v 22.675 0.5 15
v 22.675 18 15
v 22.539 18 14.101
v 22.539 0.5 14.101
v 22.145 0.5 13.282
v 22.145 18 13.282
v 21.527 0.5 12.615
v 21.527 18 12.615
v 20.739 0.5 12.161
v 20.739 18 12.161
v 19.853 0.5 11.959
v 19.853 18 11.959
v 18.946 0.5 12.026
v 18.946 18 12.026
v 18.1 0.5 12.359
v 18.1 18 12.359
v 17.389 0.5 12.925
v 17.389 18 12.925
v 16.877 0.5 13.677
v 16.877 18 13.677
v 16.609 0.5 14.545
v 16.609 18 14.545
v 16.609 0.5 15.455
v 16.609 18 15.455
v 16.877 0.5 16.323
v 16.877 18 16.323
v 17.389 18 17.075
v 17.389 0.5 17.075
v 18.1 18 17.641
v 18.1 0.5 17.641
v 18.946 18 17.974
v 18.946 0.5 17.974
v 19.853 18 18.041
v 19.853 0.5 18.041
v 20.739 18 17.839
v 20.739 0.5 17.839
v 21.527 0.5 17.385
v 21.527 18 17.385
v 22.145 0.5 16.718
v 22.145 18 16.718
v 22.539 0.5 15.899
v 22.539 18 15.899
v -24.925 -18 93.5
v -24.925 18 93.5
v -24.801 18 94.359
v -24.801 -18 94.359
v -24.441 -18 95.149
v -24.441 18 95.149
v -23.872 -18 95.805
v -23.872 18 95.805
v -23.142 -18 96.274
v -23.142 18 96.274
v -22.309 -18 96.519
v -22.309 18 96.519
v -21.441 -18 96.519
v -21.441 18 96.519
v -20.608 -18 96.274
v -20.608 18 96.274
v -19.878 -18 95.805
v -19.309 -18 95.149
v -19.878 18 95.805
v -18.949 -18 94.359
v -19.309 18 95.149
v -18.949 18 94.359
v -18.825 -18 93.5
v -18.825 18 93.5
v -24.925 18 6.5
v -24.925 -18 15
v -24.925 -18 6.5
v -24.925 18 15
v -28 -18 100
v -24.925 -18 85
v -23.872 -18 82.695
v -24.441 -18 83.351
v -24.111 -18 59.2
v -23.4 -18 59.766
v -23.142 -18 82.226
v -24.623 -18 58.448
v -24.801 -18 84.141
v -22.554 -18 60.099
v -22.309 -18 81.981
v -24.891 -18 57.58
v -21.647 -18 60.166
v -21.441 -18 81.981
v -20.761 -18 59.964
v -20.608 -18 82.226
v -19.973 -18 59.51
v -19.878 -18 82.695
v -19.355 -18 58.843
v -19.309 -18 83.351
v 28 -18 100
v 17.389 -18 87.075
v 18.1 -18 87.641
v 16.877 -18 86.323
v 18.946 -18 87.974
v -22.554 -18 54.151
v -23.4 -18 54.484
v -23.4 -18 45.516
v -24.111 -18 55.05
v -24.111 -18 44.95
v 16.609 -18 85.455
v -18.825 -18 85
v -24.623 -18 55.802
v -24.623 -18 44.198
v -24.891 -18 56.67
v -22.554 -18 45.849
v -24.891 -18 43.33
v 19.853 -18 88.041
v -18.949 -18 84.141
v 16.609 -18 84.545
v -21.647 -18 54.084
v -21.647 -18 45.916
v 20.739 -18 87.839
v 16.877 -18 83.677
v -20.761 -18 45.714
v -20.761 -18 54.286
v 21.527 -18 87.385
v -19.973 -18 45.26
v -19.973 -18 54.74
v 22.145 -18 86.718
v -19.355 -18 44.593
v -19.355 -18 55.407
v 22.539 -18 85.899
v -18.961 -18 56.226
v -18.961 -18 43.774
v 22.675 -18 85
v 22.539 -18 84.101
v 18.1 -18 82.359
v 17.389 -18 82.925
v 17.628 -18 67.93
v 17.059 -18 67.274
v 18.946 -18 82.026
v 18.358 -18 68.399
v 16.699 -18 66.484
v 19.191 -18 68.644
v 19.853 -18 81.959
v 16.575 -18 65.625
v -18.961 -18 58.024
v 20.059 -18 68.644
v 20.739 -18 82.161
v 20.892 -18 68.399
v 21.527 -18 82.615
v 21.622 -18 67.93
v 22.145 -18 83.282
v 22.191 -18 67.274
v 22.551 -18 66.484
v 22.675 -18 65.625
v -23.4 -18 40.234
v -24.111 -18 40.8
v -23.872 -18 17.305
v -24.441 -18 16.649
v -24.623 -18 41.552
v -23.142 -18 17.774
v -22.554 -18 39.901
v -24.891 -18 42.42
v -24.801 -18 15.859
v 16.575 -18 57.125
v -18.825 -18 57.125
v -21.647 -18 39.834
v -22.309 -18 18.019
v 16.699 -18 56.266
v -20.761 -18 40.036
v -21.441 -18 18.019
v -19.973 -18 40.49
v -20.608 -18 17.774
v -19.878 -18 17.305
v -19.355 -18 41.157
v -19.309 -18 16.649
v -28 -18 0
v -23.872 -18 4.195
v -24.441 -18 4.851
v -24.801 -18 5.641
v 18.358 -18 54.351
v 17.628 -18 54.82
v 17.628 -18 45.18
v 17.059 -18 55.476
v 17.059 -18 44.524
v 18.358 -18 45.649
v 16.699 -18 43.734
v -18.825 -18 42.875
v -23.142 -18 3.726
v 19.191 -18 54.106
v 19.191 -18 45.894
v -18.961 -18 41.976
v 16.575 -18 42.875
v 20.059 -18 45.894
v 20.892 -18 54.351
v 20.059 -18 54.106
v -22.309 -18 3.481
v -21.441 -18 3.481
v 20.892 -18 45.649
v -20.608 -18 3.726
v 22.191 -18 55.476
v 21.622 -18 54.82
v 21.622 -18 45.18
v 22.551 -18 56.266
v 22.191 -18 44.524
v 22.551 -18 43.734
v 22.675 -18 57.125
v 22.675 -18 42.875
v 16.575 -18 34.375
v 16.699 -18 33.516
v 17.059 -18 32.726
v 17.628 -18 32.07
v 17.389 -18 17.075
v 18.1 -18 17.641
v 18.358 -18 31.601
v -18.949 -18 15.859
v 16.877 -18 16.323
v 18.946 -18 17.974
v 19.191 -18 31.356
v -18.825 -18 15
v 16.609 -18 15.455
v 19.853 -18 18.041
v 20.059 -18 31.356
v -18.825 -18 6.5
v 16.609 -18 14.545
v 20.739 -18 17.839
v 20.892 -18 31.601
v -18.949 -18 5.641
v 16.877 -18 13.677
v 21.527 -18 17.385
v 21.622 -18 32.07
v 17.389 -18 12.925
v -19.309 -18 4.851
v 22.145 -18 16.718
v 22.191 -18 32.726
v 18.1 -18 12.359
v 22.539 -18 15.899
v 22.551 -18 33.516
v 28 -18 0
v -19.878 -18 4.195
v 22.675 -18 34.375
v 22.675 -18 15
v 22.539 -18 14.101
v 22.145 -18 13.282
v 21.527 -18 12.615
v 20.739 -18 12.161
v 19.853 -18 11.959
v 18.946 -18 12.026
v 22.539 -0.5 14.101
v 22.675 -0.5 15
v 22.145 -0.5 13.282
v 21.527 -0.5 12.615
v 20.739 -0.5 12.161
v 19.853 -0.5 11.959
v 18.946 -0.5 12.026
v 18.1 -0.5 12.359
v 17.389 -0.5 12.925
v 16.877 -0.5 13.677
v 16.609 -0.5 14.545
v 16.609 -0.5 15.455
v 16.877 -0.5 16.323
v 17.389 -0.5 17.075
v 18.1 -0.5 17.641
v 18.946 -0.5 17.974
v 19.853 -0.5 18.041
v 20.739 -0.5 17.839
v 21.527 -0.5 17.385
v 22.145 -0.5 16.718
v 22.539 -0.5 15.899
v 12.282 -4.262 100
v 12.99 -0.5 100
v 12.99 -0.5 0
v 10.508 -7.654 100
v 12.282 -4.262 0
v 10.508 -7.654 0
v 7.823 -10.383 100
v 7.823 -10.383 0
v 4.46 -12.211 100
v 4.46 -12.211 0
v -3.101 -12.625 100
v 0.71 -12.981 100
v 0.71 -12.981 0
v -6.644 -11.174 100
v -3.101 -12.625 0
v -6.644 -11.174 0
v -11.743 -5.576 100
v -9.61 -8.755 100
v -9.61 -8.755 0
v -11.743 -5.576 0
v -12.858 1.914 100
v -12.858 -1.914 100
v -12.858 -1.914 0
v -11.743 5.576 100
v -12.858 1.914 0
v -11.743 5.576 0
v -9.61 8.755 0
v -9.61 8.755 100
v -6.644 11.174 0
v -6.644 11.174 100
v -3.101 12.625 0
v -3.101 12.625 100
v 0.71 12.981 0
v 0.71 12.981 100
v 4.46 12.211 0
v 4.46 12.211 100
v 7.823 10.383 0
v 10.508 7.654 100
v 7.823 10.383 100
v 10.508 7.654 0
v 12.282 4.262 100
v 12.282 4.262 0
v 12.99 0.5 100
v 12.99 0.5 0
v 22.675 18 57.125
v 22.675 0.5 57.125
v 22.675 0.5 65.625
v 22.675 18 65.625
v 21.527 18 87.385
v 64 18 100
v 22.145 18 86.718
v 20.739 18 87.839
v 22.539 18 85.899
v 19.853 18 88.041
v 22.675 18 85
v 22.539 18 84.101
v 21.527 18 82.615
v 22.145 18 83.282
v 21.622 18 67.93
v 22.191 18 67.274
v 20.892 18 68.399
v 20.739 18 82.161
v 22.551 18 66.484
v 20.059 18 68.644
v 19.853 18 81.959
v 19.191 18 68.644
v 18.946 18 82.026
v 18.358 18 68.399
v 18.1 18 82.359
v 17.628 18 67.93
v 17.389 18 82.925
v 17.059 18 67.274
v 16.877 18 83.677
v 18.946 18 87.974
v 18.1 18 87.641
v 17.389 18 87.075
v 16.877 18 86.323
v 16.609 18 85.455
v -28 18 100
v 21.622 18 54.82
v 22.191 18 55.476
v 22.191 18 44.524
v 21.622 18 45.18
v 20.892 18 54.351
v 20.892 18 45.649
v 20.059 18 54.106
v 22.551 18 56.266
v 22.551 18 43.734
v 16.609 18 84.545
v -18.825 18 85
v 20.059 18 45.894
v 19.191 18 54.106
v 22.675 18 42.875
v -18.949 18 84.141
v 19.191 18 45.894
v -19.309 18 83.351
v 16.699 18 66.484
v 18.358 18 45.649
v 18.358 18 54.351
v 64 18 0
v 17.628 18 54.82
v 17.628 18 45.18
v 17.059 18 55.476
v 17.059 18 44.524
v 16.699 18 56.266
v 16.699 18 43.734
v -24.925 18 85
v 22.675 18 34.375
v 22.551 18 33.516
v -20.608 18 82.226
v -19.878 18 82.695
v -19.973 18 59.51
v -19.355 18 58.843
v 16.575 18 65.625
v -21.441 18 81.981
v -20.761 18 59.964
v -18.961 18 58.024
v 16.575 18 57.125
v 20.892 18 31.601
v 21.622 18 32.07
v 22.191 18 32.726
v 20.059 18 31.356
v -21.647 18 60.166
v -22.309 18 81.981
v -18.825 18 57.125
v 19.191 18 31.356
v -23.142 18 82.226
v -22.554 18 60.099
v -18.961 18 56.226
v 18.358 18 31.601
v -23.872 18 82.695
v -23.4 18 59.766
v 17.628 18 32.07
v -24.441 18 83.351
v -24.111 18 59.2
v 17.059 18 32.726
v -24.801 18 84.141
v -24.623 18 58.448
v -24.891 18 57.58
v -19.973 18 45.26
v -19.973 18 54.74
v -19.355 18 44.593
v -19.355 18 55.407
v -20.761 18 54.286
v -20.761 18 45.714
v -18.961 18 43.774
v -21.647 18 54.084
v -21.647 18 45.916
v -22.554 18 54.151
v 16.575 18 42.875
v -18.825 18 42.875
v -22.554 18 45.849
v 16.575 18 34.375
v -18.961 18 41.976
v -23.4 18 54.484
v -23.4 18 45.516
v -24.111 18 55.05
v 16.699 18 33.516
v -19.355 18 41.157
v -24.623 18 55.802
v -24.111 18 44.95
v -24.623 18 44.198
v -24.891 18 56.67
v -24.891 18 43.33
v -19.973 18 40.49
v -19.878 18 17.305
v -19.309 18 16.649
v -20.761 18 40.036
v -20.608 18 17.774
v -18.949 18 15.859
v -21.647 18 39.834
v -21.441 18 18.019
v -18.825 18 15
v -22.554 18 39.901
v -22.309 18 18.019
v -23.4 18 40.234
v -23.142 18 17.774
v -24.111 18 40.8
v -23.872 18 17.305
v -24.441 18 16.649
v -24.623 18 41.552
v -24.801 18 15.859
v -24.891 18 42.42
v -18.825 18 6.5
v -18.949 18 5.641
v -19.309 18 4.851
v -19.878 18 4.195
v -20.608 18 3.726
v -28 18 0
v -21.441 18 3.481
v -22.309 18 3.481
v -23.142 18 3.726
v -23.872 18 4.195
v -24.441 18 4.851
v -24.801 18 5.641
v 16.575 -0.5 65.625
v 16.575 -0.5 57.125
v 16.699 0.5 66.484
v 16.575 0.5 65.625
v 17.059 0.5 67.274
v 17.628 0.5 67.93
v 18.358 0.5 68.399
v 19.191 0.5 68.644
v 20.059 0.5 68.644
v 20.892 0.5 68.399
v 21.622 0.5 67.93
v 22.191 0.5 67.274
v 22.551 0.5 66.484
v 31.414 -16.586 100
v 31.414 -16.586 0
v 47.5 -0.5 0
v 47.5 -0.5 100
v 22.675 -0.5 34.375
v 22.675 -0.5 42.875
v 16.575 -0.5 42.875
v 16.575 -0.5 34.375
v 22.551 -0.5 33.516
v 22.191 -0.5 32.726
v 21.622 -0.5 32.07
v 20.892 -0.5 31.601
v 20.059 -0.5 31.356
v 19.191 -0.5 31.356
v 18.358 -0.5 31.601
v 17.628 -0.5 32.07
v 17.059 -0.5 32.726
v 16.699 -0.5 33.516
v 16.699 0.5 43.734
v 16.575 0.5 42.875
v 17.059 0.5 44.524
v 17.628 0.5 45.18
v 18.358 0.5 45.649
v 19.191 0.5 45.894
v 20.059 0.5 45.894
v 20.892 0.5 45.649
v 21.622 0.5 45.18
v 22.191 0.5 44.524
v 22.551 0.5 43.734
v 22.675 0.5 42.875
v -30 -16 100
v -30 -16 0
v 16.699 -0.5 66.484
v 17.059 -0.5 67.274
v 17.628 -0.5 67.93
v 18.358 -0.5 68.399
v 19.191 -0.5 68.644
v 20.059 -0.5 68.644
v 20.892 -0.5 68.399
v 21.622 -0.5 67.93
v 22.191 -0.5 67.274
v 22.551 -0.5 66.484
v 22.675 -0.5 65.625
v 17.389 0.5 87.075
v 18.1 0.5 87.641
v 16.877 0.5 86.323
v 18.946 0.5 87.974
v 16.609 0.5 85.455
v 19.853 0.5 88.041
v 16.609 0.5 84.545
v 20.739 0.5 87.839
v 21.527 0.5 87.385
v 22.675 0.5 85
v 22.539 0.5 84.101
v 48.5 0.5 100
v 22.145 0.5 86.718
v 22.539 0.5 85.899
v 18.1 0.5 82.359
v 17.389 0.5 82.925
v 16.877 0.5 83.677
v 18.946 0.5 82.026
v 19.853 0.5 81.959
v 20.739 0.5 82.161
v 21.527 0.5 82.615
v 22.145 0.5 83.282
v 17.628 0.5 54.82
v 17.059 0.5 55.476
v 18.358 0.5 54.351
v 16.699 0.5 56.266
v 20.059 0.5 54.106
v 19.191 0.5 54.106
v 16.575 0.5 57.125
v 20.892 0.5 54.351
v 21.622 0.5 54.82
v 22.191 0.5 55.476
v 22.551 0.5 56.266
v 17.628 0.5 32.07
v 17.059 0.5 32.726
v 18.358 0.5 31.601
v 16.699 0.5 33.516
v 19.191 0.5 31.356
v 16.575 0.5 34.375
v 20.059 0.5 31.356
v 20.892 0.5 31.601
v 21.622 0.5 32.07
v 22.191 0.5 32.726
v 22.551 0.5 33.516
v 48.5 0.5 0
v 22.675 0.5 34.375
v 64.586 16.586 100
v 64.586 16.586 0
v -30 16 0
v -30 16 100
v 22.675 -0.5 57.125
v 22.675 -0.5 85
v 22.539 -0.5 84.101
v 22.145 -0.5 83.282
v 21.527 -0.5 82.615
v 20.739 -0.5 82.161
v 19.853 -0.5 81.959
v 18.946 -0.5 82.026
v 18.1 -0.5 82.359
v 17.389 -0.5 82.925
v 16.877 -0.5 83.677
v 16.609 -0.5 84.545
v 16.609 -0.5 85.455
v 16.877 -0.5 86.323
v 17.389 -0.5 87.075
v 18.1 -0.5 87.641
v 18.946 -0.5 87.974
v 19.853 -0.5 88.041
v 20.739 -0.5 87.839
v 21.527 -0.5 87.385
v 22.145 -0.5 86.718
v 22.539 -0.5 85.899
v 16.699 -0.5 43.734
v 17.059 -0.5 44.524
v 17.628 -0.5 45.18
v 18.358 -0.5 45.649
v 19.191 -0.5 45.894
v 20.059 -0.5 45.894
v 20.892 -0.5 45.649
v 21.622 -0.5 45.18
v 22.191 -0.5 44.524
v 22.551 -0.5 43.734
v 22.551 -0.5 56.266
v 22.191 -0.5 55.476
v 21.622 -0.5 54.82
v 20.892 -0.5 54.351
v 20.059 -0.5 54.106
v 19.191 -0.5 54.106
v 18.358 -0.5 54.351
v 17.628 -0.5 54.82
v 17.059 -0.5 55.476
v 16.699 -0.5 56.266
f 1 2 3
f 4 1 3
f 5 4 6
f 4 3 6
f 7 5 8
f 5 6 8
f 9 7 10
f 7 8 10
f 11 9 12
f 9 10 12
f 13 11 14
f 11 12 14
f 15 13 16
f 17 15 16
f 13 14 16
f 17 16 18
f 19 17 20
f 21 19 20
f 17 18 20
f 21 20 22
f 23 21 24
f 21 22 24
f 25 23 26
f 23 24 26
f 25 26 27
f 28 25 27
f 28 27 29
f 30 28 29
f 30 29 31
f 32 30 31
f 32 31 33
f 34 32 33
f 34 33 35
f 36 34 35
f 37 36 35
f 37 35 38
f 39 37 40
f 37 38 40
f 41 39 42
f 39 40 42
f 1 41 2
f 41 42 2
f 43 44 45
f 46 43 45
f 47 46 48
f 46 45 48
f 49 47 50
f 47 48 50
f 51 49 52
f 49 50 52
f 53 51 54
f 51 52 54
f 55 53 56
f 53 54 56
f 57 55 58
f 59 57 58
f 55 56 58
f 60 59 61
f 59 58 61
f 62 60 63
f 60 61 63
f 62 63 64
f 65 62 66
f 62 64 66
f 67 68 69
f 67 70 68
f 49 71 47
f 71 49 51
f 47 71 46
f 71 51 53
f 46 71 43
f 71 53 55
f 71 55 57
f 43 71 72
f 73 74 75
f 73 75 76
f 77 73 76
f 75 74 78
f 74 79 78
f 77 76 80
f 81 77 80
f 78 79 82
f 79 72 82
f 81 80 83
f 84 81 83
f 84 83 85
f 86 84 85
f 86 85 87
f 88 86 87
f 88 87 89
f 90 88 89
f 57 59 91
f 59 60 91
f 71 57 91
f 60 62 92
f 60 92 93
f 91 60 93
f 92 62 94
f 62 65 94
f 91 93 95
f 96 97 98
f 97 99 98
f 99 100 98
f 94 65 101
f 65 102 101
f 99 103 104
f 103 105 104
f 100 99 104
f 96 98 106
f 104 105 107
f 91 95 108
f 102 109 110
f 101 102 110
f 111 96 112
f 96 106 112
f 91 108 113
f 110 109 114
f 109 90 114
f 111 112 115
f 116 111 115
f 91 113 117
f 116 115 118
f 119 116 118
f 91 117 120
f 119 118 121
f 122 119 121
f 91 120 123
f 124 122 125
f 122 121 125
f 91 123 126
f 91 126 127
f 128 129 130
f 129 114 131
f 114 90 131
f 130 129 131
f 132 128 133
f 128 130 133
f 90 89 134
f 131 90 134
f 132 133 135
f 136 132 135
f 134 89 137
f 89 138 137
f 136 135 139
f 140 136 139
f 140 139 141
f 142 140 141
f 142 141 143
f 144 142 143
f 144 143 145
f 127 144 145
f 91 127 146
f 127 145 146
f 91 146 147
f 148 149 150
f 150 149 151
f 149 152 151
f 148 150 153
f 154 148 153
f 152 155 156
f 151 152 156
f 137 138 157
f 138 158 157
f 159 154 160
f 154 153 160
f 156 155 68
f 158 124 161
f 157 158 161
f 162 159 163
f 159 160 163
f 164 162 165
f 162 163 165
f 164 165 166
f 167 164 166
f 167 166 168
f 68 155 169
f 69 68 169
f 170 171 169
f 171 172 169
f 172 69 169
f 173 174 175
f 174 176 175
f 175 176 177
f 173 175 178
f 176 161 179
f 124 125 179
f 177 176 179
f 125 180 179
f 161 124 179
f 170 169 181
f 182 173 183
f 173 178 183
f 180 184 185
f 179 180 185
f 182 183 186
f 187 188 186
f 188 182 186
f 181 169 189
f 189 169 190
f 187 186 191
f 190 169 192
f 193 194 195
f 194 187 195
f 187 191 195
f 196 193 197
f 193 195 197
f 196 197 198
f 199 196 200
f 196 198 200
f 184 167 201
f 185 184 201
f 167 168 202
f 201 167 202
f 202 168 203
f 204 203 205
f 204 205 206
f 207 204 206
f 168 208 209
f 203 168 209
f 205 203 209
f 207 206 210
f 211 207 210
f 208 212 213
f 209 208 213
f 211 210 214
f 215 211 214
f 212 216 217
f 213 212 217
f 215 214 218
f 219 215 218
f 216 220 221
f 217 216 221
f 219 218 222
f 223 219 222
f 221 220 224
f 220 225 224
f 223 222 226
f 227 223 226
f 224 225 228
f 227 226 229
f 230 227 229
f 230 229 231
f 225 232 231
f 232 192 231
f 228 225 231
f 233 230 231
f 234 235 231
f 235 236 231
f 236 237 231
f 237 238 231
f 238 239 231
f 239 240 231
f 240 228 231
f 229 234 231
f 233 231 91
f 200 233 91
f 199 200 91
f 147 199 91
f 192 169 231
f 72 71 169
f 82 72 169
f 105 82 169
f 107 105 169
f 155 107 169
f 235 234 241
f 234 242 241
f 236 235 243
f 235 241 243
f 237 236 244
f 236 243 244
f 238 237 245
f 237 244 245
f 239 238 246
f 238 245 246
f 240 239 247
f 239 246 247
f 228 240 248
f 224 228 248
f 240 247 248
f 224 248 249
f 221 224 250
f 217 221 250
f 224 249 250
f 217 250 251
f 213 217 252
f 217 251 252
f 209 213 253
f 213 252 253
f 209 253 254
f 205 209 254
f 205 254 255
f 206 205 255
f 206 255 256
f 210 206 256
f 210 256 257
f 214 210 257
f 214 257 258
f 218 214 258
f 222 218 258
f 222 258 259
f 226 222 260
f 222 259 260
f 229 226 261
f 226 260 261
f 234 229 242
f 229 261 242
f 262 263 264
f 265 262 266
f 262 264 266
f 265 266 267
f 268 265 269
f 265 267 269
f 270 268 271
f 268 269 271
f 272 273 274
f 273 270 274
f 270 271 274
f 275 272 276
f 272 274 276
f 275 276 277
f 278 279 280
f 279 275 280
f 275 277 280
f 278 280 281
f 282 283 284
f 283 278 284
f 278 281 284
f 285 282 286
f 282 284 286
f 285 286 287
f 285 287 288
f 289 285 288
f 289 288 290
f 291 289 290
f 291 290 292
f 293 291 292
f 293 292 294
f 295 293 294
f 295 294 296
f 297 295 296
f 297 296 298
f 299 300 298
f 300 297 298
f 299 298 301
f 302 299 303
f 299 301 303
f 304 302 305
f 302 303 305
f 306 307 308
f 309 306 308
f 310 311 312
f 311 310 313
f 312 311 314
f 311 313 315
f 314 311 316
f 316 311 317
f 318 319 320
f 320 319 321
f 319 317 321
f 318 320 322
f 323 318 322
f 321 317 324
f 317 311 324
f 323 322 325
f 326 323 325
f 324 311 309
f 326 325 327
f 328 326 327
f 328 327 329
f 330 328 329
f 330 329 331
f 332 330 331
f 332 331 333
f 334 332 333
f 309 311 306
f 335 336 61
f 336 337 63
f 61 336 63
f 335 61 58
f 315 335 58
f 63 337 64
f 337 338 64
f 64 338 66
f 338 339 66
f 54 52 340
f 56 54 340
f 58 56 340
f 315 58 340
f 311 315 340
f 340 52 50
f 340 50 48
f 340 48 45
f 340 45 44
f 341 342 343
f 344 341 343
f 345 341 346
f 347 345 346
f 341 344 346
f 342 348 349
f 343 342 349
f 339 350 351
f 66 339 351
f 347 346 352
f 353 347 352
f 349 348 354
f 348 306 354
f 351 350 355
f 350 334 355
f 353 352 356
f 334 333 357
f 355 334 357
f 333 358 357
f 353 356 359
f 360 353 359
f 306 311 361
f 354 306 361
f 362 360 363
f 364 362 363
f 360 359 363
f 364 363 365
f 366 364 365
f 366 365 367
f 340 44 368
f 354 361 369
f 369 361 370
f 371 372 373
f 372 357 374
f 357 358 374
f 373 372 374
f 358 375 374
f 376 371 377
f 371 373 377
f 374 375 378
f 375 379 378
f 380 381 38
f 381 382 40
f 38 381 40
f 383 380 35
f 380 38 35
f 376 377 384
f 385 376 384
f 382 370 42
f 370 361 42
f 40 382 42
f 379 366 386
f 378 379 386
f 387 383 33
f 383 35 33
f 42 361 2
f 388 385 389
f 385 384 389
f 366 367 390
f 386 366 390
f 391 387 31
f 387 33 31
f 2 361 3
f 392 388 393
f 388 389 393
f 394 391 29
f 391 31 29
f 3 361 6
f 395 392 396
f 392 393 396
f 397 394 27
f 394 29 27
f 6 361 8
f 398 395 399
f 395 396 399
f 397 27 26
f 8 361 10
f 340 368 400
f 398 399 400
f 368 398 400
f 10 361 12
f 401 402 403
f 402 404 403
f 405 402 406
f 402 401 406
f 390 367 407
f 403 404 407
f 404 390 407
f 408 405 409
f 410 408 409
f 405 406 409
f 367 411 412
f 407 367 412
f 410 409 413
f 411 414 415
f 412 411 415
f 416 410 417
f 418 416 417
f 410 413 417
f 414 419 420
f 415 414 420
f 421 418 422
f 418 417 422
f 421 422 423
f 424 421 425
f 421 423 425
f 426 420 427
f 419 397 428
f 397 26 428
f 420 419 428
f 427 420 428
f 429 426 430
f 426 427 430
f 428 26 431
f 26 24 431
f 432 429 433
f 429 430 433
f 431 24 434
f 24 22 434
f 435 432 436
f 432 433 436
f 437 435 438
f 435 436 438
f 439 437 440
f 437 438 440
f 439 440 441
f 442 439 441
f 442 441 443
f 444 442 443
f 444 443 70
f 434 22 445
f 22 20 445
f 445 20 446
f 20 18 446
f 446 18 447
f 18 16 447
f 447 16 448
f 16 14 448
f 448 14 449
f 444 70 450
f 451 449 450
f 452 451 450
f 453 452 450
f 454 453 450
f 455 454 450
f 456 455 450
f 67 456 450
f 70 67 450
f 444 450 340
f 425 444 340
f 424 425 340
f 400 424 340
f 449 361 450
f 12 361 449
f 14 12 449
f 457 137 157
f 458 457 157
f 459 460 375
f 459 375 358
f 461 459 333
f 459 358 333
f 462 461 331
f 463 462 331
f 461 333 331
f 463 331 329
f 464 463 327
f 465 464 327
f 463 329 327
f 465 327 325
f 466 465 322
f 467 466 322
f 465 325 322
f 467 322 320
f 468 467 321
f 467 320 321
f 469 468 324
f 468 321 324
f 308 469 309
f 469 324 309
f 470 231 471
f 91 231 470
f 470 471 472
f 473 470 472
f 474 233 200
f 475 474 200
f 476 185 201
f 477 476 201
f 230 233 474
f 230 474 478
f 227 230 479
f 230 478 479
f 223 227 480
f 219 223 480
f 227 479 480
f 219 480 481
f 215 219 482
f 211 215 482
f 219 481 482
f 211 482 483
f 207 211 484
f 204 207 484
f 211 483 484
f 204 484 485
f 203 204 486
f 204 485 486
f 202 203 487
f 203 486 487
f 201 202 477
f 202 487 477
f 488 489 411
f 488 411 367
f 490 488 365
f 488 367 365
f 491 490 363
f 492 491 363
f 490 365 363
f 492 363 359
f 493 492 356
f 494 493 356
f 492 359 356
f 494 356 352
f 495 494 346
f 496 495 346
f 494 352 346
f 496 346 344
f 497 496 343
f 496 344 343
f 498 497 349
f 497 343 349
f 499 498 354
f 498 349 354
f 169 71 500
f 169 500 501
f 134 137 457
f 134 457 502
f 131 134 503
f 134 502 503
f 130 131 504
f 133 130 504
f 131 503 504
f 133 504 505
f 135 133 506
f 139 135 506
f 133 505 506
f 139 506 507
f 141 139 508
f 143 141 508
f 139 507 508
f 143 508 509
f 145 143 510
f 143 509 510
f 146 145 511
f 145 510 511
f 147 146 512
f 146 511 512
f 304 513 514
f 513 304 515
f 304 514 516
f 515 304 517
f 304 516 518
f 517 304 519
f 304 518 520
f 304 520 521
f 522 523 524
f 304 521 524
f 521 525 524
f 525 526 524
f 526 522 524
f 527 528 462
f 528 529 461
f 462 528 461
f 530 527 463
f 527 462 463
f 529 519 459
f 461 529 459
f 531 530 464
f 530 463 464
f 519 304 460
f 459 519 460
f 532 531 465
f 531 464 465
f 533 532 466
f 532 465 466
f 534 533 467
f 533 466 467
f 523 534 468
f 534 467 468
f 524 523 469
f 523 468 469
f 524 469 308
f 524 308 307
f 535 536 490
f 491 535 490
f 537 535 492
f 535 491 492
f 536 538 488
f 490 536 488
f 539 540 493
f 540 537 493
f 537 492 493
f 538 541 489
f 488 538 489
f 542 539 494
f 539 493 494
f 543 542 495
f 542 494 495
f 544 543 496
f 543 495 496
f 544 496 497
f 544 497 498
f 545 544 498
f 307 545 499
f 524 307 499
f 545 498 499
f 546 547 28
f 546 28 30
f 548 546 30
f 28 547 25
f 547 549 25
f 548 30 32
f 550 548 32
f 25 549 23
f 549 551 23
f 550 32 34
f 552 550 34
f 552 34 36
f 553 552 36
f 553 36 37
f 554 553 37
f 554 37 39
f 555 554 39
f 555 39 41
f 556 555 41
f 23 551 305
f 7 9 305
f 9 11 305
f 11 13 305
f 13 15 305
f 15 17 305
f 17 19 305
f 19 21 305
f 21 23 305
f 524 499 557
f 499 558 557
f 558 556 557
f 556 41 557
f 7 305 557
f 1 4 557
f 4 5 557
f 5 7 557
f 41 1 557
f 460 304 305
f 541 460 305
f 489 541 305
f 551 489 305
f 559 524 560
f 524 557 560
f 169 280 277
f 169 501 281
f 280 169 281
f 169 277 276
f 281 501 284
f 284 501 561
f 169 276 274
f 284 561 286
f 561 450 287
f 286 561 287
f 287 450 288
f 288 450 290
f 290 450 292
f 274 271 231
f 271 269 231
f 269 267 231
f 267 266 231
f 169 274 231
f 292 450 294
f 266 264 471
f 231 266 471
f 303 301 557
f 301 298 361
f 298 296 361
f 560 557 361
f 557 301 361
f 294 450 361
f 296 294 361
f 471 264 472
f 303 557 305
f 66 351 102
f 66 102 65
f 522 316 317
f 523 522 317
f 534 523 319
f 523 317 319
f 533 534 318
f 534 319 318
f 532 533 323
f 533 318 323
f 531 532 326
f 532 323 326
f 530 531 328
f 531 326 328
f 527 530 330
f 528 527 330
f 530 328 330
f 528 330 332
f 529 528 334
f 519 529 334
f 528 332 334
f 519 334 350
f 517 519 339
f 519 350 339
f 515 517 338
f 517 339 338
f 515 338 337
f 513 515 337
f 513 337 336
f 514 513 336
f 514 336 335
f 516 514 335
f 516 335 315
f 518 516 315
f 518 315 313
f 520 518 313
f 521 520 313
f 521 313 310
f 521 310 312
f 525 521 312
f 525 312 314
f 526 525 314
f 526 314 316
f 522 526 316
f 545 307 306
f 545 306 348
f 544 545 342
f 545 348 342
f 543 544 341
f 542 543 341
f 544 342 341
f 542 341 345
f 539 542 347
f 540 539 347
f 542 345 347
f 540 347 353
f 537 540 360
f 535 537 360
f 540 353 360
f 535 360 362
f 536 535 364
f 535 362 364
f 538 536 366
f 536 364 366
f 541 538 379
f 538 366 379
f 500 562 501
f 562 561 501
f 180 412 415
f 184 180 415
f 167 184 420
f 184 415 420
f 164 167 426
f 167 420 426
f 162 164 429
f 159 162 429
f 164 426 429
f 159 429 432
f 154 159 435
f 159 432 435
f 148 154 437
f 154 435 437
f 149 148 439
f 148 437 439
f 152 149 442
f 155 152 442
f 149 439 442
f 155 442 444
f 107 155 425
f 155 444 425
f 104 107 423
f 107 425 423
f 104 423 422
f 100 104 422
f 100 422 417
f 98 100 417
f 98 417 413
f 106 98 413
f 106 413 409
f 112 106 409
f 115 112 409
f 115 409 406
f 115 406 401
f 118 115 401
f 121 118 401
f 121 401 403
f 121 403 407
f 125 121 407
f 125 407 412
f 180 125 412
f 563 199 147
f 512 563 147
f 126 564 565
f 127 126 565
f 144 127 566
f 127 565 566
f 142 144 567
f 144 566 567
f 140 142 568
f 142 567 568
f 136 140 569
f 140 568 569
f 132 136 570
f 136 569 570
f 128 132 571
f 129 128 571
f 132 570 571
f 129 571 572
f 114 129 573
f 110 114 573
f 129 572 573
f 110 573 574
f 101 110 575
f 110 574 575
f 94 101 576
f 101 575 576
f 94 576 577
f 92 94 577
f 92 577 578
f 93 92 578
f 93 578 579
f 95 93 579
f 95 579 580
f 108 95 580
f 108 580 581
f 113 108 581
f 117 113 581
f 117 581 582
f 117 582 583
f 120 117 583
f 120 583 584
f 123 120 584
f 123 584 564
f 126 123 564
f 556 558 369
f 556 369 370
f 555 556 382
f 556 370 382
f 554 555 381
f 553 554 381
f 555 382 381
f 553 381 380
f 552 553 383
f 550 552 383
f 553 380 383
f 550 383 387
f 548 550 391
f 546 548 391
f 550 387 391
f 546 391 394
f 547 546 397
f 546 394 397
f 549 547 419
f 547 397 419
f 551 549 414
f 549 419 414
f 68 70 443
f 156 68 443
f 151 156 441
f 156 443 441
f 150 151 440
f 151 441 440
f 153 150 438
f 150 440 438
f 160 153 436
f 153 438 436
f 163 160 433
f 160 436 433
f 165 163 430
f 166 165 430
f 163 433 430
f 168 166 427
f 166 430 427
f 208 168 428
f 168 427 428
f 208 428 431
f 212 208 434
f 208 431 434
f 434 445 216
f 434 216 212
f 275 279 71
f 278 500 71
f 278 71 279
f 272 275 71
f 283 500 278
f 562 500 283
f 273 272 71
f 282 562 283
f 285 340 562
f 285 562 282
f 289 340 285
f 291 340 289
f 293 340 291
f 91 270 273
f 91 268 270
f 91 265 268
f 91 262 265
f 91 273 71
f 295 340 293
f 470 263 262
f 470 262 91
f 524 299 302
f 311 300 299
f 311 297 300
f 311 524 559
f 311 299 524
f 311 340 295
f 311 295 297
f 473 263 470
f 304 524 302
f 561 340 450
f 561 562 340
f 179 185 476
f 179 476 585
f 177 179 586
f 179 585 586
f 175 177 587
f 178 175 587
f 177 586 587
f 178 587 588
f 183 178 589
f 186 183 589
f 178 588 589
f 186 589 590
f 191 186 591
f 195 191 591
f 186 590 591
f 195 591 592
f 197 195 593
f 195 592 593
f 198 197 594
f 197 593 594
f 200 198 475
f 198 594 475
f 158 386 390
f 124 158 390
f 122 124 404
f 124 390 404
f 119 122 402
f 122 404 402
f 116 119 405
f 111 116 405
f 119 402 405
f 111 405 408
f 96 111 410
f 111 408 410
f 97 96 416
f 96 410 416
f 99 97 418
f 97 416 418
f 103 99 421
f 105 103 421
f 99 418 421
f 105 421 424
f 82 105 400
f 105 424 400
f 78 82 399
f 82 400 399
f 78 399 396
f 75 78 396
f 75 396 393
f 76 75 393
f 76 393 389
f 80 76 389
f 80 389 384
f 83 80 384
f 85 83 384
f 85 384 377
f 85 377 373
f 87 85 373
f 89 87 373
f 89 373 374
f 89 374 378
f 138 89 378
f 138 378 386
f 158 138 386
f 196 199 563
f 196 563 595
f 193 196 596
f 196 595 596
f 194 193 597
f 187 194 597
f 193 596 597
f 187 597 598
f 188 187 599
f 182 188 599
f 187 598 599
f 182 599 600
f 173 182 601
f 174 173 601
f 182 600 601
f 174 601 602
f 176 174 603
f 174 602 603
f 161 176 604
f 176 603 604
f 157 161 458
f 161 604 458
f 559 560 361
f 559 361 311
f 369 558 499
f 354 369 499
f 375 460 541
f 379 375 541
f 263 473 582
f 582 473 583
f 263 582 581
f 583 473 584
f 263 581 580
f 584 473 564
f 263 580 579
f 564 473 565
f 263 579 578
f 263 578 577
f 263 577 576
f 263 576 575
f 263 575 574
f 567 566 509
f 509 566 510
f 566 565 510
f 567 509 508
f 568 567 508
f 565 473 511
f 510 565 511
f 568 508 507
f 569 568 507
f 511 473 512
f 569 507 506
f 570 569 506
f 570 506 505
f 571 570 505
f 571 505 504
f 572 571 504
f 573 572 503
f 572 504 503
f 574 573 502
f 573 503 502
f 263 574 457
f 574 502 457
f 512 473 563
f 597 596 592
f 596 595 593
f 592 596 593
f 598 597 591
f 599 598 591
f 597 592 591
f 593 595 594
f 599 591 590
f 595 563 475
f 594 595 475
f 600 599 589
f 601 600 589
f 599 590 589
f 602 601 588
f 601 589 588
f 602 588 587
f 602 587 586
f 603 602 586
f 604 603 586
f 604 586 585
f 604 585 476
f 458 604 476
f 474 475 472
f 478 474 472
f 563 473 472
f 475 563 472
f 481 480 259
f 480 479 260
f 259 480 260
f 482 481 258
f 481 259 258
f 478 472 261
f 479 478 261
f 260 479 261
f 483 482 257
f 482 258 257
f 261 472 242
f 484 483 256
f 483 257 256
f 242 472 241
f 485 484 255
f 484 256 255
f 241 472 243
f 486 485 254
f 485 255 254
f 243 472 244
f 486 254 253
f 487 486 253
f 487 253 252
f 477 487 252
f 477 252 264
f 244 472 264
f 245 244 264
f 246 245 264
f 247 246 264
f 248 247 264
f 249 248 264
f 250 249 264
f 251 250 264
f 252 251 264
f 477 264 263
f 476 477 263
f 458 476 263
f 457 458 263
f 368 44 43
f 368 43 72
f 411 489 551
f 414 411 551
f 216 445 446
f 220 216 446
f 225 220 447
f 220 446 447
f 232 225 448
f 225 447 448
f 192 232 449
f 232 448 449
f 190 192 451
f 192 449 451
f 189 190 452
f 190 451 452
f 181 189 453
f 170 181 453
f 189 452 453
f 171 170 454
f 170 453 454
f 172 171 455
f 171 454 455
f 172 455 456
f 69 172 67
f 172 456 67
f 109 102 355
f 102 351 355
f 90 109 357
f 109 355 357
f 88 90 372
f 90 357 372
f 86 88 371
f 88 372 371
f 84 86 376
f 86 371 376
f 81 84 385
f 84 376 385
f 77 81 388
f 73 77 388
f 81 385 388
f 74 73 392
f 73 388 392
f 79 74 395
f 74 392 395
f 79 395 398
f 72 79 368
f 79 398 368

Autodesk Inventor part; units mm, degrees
ref_plane "YZ Plane" through (0, 0, 0) normal (1, 0, 0) x (0, 1, 0)
ref_plane "XZ Plane" through (0, 0, 0) normal (0, 1, 0) x (-1, 0, 0)
ref_plane "XY Plane" through (0, 0, 0) normal (0, 0, 1) x (1, 0, 0)
sketch "Sketch1" plane through (0, 0, 0) normal (0, 0, 1) x (1, 0, 0)
  line L0 (66, 18) -> (-30, 18) construction
  line L1 (-30, -18) -> (30, -18) construction
  line L2 (30, -18) -> (33.623, -14.377) construction
  line L3 (47.5, -0.5) -> (33.623, -14.377) construction
  line L4 (-30, 18) -> (-30, -18)
  line L5 (-30, -18) -> (30, -18)
  line L6 (30, -18) -> (47.5, -0.5)
  line L7 (47.5, -0.5) -> (12.9904, -0.5)
  line L8 (12.9904, 0.5) -> (48.5, 0.5)
  line L9 (48.5, 0.5) -> (66, 18)
  line L10 (66, 18) -> (-30, 18)
  arc A0 (12.9904, 0.5) -> (12.9904, -0.5) centre (0, 0) ccw
  line L11 (12.9904, 0.5) -> (12.9904, -0.5) construction
  point P0 (-30, 0)
  point P1 (18, 18)
  dimension "d2" = 36
  dimension "d4" = 60
  dimension "d5" = 135
  dimension "d7" = 13
  dimension "d10" = 1
  dimension "d12" = 30
extrude "Extrusion1" add sketch "Sketch1" along normal blind 100
sketch "Sketch2" plane through (-30, 18, 0) normal (0, 1, 0) x (1, 0, 0)
  line L0 (118, 0) -> (118, -100) projected
  line L1 (118, 0) -> (2, 0) projected
  line L2 (2, -100) -> (2, 0) projected
  line L3 (2, -100) -> (118, -100) projected
  line L4 (108.825, -15) -> (108.825, -6.5) projected
  arc A0 (114.925, -6.5) -> (108.825, -6.5) centre (111.875, -6.5) ccw projected
  line L5 (114.925, -6.5) -> (114.925, -15) projected
  arc A1 (108.825, -15) -> (114.925, -15) centre (111.875, -15) ccw projected
  line L6 (5.075, -15) -> (5.075, -6.5) projected
  arc A2 (11.175, -6.5) -> (5.075, -6.5) centre (8.125, -6.5) ccw projected
  line L7 (11.175, -6.5) -> (11.175, -15) projected
  arc A3 (5.075, -15) -> (11.175, -15) centre (8.125, -15) ccw projected
  circle A4 centre (49.625, -15) radius 3.05 projected
  circle A5 centre (70.375, -15) radius 3.05 projected
  circle A6 centre (70.375, -85) radius 3.05 projected
  circle A7 centre (49.625, -85) radius 3.05 projected
  line L8 (114.925, -85) -> (114.925, -93.5) projected
  arc A8 (108.825, -93.5) -> (114.925, -93.5) centre (111.875, -93.5) ccw projected
  line L9 (108.825, -93.5) -> (108.825, -85) projected
  arc A9 (114.925, -85) -> (108.825, -85) centre (111.875, -85) ccw projected
  circle A10 centre (111.875, -57.125) radius 3.05 projected
  line L10 (67.325, -42.875) -> (67.325, -34.375) projected
  arc A11 (73.425, -34.375) -> (67.325, -34.375) centre (70.375, -34.375) ccw projected
  line L11 (73.425, -34.375) -> (73.425, -42.875) projected
  arc A12 (67.325, -42.875) -> (73.425, -42.875) centre (70.375, -42.875) ccw projected
  circle A13 centre (8.125, -42.875) radius 3.05 projected
  circle A14 centre (111.875, -42.875) radius 3.05 projected
  line L12 (46.575, -42.875) -> (46.575, -34.375) projected
  arc A15 (52.675, -34.375) -> (46.575, -34.375) centre (49.625, -34.375) ccw projected
  line L13 (52.675, -34.375) -> (52.675, -42.875) projected
  arc A16 (46.575, -42.875) -> (52.675, -42.875) centre (49.625, -42.875) ccw projected
  circle A17 centre (8.125, -57.125) radius 3.05 projected
  line L14 (46.575, -65.625) -> (46.575, -57.125) projected
  arc A18 (52.675, -57.125) -> (46.575, -57.125) centre (49.625, -57.125) ccw projected
  line L15 (52.675, -57.125) -> (52.675, -65.625) projected
  arc A19 (46.575, -65.625) -> (52.675, -65.625) centre (49.625, -65.625) ccw projected
  line L16 (5.075, -93.5) -> (5.075, -85) projected
  arc A20 (11.175, -85) -> (5.075, -85) centre (8.125, -85) ccw projected
  line L17 (11.175, -85) -> (11.175, -93.5) projected
  arc A21 (5.075, -93.5) -> (11.175, -93.5) centre (8.125, -93.5) ccw projected
  line L18 (67.325, -65.625) -> (67.325, -57.125) projected
  arc A22 (73.425, -57.125) -> (67.325, -57.125) centre (70.375, -57.125) ccw projected
  line L19 (73.425, -57.125) -> (73.425, -65.625) projected
  arc A23 (67.325, -65.625) -> (73.425, -65.625) centre (70.375, -65.625) ccw projected
  point P0 (30, 0)
extrude "Extrusion2" cut sketch "Sketch2" against normal through all contours L6 A2 L7 A3 | A4 | A7 | A13 | L12 A15 L13 A16 | A17 | L14 A18 L15 A19 | L16 A20 L17 A21
chamfer "Chamfer1" distance 2 angle 45 4 edges at (-30, 18, 50) (-30, -18, 50) (66, 18, 50) (30, -18, 50)
properties part number "AXTSC" material "PC/ABS Plastic"
